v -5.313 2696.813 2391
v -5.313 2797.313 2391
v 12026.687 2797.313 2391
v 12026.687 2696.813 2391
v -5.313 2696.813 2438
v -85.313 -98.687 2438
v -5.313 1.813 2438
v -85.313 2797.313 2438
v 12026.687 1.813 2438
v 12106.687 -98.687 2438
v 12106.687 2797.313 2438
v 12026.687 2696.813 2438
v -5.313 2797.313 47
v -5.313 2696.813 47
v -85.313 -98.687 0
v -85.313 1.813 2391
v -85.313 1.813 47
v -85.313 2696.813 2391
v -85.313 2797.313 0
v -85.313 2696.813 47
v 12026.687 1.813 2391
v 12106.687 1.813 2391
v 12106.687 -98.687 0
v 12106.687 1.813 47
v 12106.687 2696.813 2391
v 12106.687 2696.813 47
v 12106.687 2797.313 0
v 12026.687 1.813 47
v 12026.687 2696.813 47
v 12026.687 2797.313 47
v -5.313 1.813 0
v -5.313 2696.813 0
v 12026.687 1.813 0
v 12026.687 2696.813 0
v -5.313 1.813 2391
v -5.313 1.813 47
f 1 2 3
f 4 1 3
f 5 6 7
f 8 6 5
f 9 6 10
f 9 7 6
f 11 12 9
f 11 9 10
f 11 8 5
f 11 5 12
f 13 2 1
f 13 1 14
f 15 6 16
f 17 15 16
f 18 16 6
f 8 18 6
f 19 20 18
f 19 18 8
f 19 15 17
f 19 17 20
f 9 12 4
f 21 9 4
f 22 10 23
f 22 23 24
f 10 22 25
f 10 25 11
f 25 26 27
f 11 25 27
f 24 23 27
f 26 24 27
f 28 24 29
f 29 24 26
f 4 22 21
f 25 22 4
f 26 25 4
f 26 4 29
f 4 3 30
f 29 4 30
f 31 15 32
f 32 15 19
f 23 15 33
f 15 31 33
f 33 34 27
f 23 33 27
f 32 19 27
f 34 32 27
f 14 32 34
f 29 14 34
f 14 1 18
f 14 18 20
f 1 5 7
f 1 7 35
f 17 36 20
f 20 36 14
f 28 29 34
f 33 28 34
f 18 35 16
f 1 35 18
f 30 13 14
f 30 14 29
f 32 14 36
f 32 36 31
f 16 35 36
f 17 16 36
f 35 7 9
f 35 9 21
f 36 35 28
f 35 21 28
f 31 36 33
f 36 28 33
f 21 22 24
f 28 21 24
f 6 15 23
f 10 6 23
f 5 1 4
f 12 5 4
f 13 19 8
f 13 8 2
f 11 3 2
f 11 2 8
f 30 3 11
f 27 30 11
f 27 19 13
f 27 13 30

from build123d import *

# Parameters (mm, degrees)
SKETCH1_W           = 12192
SKETCH1_H           = 2896
SKETCH1_W_2         = 12032
SKETCH1_H_2         = 2695
BOSS_EXTRUDE1_DEPTH = 2438
SKETCH5_W           = 12032
SKETCH5_H           = 2344
CUT_EXTRUDE2_DEPTH  = 100.5
SKETCH6_W           = 2344
SKETCH6_H           = 2695
CUT_EXTRUDE5_DEPTH  = 12745.162178487


with BuildPart() as part:
    # Sketch1 → Boss-Extrude1 (new body)
    with BuildSketch(Plane.XY):
        with Locations((6010.686556927, 1349.313288066)):
            Rectangle(SKETCH1_W, SKETCH1_H)
        with Locations((6010.686556927, 1349.313288066)):
            Rectangle(SKETCH1_W_2, SKETCH1_H_2, mode=Mode.SUBTRACT)
    extrude(amount=BOSS_EXTRUDE1_DEPTH)

    # Sketch5 → Cut-Extrude2 (cut)
    with BuildSketch(Plane(origin=(0, 2797.313288066, 0), x_dir=(1, 0, 0), z_dir=(0, 1, 0))):
        with Locations((6010.686556927, -1219)):
            Rectangle(SKETCH5_W, SKETCH5_H)
    extrude(amount=-CUT_EXTRUDE2_DEPTH, mode=Mode.SUBTRACT)

    # Sketch6 → Cut-Extrude5 (cut, through all)
    with BuildSketch(Plane(origin=(12106.686556927, 0, 0), x_dir=(0, 0, -1), z_dir=(1, 0, 0))):
        with Locations((-1219, 1349.313288066)):
            Rectangle(SKETCH6_W, SKETCH6_H)
    extrude(amount=-CUT_EXTRUDE5_DEPTH, mode=Mode.SUBTRACT)


solid = part.part
